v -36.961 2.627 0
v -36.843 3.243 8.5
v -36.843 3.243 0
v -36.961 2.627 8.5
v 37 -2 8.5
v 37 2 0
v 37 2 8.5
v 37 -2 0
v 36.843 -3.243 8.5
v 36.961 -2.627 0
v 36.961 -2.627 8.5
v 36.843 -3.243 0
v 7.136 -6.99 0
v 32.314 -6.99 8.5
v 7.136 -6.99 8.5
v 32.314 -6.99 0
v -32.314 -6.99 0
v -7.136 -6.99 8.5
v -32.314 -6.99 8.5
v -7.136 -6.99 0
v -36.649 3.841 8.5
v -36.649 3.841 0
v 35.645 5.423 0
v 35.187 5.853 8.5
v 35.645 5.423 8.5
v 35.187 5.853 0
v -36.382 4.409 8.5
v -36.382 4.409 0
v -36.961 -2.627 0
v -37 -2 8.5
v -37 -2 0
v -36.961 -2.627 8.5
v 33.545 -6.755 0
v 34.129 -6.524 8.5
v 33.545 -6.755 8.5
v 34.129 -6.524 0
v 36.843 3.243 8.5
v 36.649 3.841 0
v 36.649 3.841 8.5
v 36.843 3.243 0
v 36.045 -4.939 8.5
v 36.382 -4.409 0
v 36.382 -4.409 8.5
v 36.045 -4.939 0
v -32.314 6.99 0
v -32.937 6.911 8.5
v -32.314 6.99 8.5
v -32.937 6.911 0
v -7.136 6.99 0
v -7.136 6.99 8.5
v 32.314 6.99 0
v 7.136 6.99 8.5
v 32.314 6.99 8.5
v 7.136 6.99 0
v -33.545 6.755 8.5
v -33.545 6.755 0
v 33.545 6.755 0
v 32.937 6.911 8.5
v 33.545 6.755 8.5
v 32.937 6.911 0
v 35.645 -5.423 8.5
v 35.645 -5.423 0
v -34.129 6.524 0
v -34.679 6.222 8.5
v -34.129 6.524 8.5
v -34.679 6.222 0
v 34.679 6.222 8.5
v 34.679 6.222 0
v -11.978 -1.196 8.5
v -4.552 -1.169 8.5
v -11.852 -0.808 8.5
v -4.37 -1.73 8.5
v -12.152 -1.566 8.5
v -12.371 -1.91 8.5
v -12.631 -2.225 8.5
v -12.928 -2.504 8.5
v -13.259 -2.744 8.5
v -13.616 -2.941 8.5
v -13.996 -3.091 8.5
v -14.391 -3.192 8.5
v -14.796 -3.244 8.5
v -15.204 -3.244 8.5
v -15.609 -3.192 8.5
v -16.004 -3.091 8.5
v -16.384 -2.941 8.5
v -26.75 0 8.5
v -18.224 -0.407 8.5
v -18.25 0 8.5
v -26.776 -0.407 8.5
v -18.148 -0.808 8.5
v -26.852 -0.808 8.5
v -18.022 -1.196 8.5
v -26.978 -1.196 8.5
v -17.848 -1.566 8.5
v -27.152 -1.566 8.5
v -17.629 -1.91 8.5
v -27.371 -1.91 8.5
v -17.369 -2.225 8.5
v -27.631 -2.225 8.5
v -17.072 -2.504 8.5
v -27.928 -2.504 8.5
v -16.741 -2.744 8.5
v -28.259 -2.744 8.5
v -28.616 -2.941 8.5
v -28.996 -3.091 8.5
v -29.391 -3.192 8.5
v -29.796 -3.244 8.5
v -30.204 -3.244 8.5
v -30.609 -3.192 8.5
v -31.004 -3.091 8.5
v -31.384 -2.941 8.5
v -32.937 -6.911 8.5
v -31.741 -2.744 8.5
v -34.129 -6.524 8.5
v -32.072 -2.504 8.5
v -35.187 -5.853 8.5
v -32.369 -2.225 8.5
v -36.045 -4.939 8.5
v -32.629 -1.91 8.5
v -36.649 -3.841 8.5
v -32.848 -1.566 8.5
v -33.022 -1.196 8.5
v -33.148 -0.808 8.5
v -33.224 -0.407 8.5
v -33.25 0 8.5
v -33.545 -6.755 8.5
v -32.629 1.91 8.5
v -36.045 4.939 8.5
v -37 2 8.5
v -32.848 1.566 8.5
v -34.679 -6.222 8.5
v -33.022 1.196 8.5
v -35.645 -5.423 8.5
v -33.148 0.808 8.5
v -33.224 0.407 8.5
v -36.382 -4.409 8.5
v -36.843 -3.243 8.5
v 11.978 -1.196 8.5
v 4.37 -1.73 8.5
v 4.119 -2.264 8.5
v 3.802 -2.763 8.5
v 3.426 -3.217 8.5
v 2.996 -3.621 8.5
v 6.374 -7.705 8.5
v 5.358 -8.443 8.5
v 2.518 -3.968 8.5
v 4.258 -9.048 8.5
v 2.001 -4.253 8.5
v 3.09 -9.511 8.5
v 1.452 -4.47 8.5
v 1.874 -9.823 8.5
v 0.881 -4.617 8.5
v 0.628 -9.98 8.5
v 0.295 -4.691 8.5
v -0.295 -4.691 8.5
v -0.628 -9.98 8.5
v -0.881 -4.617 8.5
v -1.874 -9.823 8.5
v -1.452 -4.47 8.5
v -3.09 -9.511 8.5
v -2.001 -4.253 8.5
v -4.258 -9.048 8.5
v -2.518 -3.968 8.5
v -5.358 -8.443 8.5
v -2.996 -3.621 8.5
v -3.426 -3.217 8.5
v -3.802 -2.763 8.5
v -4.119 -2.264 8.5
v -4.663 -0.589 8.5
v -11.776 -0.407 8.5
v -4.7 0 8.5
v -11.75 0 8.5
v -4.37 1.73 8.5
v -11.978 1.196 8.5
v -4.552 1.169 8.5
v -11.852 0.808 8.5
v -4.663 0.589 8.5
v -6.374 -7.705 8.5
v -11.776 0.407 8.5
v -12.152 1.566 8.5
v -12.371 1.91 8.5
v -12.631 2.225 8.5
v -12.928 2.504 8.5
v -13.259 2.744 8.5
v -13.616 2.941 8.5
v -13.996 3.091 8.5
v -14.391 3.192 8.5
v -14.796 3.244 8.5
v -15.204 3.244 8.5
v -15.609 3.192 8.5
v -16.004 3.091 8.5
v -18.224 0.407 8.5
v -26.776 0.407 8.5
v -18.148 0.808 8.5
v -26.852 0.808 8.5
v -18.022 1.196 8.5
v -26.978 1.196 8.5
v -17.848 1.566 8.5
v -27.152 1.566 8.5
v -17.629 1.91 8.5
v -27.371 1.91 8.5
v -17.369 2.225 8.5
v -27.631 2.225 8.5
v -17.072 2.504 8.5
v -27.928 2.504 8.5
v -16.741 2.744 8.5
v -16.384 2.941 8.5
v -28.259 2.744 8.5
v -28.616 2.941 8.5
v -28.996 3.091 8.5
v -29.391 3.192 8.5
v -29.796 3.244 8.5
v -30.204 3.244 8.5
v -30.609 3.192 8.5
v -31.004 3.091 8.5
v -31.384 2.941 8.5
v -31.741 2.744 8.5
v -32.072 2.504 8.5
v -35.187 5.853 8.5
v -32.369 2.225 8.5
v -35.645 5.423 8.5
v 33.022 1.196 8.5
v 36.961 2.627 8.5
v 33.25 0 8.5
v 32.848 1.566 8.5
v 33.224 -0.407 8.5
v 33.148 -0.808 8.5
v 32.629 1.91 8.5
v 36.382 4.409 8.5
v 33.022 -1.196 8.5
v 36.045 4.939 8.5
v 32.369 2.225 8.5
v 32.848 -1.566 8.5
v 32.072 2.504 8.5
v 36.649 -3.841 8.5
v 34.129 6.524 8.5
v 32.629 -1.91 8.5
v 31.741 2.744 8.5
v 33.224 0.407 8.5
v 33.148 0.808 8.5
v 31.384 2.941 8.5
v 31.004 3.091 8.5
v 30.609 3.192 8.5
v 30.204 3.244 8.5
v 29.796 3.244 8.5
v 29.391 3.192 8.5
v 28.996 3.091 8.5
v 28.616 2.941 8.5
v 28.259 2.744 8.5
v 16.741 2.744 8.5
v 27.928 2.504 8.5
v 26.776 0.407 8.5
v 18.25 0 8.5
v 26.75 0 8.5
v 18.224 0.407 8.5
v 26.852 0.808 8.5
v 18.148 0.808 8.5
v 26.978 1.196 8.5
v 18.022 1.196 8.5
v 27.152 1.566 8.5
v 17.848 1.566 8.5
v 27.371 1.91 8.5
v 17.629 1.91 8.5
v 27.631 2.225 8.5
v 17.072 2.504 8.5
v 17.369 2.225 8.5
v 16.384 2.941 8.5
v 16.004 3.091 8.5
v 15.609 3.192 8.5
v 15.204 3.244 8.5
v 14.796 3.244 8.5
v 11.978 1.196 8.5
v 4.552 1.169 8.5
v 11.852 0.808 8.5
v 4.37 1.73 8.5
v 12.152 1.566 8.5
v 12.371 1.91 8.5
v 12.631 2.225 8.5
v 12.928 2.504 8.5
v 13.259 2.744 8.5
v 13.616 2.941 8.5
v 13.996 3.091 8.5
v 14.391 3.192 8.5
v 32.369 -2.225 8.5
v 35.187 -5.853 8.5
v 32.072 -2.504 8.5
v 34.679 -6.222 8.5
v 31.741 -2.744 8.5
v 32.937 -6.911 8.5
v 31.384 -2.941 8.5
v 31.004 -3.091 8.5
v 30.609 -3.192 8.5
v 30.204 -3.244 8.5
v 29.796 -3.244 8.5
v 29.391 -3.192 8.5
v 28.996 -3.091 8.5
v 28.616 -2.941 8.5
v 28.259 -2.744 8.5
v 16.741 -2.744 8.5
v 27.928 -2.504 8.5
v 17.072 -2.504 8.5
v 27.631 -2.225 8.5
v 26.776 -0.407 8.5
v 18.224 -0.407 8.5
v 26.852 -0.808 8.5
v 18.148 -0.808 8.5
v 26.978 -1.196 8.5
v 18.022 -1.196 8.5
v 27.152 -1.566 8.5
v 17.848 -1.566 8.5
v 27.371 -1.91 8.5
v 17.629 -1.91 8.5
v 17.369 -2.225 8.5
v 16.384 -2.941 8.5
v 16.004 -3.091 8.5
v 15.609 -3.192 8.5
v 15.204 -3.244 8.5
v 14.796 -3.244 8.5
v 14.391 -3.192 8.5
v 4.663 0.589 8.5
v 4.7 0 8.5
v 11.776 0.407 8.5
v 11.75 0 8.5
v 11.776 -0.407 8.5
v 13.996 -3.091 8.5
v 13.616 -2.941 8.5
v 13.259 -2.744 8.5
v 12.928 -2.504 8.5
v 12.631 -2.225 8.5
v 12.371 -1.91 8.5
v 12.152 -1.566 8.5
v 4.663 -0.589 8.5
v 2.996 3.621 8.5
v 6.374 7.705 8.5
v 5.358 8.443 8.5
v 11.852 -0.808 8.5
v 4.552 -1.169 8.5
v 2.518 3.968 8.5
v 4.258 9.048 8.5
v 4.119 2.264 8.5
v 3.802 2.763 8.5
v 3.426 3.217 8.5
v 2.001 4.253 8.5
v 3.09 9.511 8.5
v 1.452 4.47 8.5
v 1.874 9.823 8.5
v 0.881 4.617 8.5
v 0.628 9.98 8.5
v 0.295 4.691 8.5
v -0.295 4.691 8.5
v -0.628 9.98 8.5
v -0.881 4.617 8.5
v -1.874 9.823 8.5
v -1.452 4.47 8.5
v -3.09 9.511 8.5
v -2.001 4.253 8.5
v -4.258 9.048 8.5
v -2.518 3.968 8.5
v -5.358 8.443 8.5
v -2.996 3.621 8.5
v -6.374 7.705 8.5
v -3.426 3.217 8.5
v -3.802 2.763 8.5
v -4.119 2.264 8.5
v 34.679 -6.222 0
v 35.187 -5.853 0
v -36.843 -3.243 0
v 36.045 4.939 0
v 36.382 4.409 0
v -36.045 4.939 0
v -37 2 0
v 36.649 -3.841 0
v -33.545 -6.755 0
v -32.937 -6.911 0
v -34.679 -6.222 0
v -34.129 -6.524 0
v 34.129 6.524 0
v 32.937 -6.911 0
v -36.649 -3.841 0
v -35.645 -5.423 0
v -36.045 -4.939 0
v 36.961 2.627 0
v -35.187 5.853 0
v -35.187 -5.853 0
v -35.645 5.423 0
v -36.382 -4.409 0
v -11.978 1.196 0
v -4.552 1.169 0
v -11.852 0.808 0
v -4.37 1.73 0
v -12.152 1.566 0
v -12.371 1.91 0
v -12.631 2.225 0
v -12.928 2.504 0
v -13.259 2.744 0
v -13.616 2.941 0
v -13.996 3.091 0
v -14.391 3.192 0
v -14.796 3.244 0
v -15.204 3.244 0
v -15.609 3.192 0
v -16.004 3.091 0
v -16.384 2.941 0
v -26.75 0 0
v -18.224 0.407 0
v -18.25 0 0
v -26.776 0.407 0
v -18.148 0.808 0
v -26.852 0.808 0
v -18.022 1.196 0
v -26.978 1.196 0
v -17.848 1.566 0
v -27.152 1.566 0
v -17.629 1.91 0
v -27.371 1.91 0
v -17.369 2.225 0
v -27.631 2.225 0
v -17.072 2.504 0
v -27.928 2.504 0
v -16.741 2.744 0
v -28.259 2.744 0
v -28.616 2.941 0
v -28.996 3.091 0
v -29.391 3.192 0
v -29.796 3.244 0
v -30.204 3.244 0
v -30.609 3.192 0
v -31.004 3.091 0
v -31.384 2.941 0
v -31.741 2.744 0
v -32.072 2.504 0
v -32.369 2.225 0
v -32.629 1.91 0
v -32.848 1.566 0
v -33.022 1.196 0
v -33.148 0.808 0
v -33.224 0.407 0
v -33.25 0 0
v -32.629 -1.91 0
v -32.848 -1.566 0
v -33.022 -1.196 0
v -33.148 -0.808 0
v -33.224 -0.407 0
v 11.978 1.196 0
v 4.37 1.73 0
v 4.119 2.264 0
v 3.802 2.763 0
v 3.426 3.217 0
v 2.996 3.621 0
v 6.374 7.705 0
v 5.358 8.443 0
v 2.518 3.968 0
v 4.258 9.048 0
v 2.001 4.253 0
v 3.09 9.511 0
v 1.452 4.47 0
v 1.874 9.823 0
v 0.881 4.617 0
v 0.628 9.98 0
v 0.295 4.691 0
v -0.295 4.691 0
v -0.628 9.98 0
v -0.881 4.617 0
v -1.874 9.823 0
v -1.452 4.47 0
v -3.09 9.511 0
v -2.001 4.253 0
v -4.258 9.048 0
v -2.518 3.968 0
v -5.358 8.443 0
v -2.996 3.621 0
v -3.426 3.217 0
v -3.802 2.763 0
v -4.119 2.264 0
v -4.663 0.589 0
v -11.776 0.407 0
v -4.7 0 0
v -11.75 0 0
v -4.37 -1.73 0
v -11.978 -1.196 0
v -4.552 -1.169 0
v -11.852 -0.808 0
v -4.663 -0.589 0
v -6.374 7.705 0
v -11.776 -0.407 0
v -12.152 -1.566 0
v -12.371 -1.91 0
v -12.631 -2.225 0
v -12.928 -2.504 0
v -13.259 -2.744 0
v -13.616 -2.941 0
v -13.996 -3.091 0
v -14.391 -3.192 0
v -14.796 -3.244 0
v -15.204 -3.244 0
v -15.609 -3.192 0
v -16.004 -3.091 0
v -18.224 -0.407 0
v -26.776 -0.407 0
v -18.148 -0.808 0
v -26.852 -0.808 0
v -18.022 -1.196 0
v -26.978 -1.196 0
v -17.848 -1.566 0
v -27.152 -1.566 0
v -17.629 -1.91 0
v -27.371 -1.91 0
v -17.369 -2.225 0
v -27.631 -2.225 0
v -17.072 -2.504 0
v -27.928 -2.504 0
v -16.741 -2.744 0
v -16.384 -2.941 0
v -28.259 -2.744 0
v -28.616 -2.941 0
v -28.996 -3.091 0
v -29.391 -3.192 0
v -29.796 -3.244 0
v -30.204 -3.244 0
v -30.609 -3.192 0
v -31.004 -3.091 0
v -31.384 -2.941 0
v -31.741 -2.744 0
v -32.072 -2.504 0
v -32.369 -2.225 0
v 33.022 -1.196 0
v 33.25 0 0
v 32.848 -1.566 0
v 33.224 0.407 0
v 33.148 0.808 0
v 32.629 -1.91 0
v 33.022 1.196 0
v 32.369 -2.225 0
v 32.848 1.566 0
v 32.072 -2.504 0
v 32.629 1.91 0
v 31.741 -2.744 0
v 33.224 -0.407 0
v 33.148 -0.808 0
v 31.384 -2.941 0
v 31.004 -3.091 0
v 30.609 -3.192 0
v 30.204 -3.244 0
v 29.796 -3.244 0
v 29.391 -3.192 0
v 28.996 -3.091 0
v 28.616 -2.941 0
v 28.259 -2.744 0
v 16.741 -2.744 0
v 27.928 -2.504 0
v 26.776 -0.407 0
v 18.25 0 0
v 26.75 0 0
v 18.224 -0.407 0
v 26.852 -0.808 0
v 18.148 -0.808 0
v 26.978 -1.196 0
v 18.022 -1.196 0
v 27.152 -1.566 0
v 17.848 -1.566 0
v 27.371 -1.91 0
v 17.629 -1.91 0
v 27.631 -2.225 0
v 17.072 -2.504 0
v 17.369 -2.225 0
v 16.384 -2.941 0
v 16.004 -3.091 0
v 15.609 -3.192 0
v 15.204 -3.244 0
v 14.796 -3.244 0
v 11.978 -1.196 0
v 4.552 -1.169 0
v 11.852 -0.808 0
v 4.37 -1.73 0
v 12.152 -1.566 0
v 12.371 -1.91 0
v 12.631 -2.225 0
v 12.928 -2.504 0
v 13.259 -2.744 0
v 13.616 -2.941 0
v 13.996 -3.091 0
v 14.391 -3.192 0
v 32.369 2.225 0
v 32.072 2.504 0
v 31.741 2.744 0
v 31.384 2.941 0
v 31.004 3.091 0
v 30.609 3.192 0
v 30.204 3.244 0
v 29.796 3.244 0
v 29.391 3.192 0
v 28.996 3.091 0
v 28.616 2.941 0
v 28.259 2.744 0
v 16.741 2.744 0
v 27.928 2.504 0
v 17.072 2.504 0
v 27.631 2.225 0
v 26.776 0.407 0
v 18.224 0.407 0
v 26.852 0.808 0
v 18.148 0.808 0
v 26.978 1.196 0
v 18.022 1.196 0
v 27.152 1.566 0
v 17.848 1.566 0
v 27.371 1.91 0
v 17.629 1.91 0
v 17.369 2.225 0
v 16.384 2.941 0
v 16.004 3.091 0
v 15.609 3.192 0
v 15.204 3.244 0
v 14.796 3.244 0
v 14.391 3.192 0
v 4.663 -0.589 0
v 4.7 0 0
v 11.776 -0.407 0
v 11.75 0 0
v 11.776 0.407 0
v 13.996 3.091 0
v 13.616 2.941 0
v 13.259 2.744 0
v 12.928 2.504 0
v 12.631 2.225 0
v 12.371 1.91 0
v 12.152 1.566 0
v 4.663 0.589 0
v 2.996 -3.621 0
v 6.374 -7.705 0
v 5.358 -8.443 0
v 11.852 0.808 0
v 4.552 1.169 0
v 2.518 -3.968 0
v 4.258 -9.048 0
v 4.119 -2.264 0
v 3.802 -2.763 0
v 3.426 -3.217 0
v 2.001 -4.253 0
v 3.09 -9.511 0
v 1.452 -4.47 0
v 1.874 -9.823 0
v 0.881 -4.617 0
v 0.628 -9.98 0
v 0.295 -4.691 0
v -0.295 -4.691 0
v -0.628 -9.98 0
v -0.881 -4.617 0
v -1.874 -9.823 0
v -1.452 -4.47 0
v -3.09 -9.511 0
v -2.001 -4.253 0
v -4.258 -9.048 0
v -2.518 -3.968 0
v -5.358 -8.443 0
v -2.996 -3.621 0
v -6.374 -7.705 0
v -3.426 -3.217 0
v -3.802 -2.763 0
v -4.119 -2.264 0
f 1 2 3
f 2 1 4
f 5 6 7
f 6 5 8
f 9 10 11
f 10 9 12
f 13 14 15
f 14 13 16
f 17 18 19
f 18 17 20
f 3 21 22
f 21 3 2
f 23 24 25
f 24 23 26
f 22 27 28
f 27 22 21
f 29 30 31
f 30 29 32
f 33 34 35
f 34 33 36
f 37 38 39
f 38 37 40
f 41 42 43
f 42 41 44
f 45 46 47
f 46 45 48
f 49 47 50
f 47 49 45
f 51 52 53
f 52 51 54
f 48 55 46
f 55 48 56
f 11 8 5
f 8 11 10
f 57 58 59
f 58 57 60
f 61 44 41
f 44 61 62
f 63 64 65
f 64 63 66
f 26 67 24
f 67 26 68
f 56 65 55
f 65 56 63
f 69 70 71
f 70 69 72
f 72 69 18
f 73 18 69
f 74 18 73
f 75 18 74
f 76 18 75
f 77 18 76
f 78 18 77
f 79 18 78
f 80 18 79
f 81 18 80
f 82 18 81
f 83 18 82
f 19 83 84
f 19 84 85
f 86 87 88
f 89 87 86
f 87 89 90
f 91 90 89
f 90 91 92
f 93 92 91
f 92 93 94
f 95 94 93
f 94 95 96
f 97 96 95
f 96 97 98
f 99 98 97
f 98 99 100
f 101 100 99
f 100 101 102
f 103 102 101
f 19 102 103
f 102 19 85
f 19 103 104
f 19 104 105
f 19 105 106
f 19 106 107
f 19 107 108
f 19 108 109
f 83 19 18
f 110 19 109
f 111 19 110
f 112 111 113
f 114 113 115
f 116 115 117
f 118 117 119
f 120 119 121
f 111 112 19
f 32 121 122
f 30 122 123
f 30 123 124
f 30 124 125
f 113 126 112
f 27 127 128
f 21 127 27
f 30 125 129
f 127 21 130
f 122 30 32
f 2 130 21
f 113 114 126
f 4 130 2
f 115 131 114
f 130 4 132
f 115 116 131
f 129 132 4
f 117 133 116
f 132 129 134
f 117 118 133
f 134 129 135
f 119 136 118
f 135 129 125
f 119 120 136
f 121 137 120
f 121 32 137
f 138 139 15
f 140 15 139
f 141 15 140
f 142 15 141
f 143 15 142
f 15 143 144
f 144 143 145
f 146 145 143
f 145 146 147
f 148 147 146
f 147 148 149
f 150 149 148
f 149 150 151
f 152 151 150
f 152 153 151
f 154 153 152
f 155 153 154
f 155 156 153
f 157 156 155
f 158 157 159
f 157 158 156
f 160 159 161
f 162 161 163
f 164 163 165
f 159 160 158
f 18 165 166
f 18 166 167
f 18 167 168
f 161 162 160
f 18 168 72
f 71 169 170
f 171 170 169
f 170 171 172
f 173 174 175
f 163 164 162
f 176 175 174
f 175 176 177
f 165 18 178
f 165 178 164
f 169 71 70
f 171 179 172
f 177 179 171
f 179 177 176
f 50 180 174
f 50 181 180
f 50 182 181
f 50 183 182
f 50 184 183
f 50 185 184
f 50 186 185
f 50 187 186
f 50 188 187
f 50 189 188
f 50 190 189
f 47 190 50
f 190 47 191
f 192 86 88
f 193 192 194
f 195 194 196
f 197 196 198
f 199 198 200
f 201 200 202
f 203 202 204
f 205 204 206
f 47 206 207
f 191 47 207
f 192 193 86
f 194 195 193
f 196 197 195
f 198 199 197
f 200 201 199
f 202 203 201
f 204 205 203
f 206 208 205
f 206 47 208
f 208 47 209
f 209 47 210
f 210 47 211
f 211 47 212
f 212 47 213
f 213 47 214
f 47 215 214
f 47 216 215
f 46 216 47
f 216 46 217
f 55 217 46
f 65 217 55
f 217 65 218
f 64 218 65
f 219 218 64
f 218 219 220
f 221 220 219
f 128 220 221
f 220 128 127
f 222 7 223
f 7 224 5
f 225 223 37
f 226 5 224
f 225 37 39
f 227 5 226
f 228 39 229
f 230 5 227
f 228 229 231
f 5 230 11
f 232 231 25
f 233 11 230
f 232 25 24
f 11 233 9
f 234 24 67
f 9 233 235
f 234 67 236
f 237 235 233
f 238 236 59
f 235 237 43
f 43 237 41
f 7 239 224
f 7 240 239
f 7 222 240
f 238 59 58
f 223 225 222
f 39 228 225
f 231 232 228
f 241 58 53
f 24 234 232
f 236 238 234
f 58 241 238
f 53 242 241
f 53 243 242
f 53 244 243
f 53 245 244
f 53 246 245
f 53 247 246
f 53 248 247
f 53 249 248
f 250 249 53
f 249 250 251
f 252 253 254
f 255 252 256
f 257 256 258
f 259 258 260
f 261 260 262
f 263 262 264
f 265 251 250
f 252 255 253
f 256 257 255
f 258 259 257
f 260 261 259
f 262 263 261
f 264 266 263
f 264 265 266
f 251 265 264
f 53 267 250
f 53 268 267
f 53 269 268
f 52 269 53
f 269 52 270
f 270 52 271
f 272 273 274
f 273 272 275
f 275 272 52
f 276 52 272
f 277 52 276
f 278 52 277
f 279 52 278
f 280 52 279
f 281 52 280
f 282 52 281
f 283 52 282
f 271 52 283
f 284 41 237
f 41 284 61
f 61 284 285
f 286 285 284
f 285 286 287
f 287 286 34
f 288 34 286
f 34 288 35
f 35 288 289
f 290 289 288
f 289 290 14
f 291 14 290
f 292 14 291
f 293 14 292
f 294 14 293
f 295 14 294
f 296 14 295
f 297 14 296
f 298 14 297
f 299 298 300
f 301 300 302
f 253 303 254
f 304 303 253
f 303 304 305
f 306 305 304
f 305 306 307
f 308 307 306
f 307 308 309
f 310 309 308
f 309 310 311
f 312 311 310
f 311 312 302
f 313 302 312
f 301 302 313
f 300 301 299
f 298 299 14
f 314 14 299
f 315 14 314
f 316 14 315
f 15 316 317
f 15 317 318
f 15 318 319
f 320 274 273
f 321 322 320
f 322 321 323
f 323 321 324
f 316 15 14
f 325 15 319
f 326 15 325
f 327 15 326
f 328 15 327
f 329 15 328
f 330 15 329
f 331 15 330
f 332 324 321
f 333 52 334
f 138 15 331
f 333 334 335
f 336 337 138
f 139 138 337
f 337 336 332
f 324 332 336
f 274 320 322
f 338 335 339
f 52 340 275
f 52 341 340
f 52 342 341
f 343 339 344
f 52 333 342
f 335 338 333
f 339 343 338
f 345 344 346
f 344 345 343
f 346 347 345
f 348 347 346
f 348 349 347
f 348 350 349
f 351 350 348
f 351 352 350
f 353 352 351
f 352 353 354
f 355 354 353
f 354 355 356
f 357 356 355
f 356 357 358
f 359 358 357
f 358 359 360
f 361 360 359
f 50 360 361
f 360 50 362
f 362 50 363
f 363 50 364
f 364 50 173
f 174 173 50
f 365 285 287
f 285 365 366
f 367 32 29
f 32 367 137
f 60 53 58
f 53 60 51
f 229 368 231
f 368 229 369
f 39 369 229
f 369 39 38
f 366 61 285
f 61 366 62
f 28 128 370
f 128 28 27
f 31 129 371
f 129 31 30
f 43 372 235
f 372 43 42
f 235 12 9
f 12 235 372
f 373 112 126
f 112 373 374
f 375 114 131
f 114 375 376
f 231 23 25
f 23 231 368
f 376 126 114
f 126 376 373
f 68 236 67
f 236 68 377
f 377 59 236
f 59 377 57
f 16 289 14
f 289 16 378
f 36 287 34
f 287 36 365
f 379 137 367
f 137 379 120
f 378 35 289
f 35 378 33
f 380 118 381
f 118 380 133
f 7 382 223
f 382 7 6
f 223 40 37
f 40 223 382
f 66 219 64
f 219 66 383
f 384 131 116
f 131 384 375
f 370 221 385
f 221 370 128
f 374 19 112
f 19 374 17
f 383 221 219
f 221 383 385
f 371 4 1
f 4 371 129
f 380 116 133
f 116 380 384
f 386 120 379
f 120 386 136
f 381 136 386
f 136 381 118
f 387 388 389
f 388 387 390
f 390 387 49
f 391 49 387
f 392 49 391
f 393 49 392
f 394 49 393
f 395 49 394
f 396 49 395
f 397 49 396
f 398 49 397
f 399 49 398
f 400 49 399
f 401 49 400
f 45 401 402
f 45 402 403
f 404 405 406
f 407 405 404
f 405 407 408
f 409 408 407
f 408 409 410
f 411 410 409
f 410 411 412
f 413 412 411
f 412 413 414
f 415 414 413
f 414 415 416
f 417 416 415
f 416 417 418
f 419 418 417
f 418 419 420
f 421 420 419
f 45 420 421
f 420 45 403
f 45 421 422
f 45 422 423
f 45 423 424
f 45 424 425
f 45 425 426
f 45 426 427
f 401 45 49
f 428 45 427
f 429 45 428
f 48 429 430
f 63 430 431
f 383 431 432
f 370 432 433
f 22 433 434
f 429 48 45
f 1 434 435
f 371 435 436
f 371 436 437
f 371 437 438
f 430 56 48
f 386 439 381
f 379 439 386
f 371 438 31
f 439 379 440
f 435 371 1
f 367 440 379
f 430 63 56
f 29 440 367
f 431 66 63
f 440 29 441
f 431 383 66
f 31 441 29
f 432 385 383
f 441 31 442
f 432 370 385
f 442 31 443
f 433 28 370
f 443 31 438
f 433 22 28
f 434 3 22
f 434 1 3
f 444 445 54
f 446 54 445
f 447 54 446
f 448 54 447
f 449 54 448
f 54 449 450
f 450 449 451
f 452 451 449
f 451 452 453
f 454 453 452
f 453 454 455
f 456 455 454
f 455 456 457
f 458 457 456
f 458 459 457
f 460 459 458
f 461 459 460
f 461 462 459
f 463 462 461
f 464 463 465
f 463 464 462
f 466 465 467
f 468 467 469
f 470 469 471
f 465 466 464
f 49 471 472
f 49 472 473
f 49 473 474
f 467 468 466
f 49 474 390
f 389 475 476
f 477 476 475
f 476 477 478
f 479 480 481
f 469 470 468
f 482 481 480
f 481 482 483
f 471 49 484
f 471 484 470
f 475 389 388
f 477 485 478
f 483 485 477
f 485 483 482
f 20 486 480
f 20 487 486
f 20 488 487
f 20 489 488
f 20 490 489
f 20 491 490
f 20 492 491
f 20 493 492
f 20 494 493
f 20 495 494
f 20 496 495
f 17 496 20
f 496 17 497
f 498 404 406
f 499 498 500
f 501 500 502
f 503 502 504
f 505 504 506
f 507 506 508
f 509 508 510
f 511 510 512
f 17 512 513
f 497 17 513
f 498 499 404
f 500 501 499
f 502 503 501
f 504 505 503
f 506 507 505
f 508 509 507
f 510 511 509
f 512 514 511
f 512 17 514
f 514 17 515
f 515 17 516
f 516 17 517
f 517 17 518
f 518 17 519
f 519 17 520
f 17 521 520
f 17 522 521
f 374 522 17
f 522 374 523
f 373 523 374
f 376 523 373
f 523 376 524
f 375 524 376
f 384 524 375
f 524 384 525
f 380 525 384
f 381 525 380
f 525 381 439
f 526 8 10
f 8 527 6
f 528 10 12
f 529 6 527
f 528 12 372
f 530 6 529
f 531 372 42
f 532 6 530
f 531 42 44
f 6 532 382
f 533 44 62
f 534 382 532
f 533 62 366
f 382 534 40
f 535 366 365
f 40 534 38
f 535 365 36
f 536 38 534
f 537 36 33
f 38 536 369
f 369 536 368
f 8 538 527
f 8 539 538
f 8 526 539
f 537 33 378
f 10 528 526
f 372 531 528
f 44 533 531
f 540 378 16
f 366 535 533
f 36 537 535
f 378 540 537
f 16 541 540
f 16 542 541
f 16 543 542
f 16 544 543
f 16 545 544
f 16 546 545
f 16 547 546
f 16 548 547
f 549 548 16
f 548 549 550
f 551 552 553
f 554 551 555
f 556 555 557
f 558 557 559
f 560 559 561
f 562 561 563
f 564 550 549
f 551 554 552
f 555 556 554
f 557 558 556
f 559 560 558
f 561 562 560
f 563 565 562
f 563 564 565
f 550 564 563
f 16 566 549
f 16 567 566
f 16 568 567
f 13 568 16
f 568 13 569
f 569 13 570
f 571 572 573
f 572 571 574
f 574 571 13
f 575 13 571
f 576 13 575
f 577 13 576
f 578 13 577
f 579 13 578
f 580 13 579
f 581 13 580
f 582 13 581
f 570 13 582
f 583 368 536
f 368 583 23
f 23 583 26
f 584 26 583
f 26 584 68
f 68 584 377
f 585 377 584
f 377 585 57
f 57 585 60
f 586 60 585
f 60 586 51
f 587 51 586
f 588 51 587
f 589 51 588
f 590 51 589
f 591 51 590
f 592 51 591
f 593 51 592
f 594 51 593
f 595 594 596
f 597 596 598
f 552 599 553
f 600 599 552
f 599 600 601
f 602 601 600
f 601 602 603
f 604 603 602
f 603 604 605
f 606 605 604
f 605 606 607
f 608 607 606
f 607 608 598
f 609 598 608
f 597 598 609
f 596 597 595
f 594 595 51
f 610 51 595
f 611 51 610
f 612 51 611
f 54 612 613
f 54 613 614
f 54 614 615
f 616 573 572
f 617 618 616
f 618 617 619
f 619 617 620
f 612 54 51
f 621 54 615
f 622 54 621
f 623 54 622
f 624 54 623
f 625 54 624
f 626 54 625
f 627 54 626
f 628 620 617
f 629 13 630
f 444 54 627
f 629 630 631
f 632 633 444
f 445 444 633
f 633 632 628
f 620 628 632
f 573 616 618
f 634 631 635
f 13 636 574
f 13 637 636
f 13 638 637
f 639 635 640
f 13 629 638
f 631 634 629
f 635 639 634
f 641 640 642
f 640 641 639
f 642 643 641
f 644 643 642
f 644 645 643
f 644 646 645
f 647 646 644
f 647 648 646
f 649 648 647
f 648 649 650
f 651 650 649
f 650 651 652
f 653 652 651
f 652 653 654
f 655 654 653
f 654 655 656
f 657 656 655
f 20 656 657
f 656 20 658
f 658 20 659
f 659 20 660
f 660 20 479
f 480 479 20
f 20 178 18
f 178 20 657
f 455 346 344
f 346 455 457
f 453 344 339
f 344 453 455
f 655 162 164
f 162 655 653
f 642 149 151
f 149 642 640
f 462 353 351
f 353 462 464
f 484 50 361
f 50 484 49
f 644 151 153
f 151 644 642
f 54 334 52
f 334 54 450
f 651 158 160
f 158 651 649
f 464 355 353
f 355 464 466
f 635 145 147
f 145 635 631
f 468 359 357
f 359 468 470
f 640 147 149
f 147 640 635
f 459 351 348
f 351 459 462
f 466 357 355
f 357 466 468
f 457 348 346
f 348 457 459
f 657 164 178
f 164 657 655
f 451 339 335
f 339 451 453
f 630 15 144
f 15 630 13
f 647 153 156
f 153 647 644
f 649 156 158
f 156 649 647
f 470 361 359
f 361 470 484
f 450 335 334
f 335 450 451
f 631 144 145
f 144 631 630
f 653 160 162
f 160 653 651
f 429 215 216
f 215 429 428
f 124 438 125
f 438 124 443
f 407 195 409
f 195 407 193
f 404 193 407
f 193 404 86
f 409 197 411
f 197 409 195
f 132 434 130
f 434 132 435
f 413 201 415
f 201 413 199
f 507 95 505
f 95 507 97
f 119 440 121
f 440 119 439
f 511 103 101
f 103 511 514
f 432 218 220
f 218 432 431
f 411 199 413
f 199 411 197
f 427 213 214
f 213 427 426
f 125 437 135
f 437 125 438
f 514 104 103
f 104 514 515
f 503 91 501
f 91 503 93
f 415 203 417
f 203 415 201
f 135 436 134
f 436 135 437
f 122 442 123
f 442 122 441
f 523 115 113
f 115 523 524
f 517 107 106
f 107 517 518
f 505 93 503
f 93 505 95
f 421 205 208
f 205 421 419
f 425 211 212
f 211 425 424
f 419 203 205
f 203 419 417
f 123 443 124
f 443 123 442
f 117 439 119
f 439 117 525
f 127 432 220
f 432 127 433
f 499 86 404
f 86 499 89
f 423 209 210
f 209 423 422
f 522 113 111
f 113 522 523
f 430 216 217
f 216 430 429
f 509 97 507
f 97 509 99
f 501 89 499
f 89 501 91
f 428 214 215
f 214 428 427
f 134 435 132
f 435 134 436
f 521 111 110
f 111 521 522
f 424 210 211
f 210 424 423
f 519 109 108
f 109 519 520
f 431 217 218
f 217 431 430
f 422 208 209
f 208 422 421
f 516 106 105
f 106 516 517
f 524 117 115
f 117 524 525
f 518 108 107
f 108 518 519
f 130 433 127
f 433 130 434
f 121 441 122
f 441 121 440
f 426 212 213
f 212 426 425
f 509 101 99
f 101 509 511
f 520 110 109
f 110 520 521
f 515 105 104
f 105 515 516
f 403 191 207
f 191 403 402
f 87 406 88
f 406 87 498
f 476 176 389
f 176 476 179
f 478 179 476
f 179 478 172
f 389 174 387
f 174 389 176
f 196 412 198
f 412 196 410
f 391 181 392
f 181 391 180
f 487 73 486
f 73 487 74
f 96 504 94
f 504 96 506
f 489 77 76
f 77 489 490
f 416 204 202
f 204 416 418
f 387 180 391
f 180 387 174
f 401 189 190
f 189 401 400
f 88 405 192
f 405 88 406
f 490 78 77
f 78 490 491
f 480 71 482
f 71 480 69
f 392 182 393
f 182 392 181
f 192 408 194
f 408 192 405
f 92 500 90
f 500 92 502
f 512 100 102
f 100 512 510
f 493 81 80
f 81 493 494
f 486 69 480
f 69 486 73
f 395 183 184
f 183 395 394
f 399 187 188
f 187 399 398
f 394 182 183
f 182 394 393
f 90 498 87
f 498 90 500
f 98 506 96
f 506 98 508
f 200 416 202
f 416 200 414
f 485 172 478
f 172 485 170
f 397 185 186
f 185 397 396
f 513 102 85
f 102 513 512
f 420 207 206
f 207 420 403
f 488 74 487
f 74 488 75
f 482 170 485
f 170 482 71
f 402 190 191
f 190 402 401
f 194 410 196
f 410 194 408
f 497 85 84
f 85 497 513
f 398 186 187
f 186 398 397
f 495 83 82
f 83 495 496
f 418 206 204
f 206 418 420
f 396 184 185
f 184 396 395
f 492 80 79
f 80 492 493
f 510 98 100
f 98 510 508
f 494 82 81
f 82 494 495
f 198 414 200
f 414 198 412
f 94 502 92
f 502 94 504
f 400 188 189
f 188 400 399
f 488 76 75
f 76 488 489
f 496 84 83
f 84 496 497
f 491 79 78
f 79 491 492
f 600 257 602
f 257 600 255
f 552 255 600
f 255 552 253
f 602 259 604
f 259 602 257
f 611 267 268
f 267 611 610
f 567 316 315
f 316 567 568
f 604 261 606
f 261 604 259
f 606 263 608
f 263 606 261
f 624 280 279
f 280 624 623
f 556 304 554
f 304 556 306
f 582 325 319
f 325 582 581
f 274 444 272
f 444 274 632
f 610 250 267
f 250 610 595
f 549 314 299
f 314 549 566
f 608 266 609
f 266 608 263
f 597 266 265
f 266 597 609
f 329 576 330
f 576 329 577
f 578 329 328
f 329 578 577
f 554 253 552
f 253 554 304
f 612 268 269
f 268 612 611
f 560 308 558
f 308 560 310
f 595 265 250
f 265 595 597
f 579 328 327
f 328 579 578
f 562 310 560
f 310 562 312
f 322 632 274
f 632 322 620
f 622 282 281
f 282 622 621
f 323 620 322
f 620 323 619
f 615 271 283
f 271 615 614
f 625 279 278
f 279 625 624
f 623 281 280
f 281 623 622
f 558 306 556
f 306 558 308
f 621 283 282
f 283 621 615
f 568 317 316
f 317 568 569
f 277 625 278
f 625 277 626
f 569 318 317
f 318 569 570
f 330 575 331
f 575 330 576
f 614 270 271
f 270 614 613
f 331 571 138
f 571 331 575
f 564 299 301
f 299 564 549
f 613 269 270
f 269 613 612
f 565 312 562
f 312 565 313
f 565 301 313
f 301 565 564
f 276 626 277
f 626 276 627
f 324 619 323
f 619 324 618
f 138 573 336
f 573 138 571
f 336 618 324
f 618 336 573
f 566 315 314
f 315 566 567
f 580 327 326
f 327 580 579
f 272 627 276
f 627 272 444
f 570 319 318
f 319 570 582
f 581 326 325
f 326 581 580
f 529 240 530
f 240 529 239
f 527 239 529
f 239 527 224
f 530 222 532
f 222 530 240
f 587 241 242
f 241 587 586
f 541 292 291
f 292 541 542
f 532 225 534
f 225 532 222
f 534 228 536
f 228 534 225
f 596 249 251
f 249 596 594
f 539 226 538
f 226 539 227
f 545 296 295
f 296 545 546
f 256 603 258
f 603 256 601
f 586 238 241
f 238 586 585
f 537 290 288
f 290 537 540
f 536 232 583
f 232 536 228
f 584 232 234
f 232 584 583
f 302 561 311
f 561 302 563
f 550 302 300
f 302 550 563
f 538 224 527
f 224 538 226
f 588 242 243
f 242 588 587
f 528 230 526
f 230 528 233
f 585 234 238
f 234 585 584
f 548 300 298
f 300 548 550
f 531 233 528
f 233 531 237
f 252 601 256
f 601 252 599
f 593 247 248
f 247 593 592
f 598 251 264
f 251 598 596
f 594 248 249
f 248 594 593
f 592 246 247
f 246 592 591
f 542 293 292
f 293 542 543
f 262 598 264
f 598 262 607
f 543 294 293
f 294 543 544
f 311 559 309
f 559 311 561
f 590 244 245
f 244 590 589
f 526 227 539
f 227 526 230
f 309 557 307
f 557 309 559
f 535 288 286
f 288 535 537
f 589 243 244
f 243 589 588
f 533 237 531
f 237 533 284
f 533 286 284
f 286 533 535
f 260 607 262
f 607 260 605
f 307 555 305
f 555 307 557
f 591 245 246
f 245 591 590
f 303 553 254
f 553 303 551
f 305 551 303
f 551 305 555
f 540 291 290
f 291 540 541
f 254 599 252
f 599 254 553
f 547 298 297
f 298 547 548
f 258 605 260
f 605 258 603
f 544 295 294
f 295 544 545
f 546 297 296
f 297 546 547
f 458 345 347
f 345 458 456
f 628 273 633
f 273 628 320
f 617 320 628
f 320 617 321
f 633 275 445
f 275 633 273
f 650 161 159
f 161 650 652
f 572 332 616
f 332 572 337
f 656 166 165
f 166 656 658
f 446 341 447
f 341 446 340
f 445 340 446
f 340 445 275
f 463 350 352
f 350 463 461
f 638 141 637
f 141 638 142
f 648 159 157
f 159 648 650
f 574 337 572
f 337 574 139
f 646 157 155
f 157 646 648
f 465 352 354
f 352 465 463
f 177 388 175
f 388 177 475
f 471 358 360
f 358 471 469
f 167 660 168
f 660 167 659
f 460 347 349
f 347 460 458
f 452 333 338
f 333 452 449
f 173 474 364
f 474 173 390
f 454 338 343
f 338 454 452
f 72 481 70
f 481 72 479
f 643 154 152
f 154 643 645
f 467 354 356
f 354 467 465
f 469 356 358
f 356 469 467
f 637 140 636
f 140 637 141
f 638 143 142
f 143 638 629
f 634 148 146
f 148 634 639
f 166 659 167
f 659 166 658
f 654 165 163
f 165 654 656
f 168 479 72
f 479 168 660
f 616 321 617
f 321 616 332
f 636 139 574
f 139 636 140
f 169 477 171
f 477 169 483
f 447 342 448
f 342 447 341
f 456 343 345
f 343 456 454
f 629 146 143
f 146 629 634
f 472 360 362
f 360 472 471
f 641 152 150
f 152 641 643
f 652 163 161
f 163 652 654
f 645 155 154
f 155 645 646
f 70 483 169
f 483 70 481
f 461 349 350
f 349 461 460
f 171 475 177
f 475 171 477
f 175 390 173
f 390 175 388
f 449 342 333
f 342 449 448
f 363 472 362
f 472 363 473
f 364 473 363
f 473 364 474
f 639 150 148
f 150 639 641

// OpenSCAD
$fn = 50;


difference() {
	union() {
		*color(alpha = 1.0000000000, c = "gray") {
			translate(v = [0, 7, 0]) {
				linear_extrude(height = 1) {
					text(font = "Arial:style=Bold", halign = "center", size = 4.5000000000, text = "COMMENT plate main", valign = "center");
				}
			}
		}
		*color(alpha = 1.0000000000, c = "gray") {
			translate(v = [0, 14, 0]) {
				linear_extrude(height = 1) {
					text(font = "Arial:style=Bold", halign = "center", size = 4.5000000000, text = "COMMENT description oobb_plate_shape_p_type_8.5_depth_5_width_1_height_8.5_thickness_slip_center_extra", valign = "center");
				}
			}
		}
		hull() {
			translate(v = [-32.0000000000, 2.0000000000, 0]) {
				cylinder(h = 8.5000000000, r = 5);
			}
			translate(v = [32.0000000000, 2.0000000000, 0]) {
				cylinder(h = 8.5000000000, r = 5);
			}
			translate(v = [-32.0000000000, -2.0000000000, 0]) {
				cylinder(h = 8.5000000000, r = 5);
			}
			translate(v = [32.0000000000, -2.0000000000, 0]) {
				cylinder(h = 8.5000000000, r = 5);
			}
		}
		cylinder(h = 8.5000000000, r = 10.0000000000);
	}
	union() {
		*color(alpha = 1.0000000000, c = "gray") {
			translate(v = [0, 7, 0]) {
				linear_extrude(height = 1) {
					text(font = "Arial:style=Bold", halign = "center", size = 4.5000000000, text = "COMMENT holes main", valign = "center");
				}
			}
		}
		*color(alpha = 1.0000000000, c = "gray") {
			translate(v = [0, 14, 0]) {
				linear_extrude(height = 1) {
					text(font = "Arial:style=Bold", halign = "center", size = 4.5000000000, text = "COMMENT description oobb_holes_shape_n_type_5_width_1_height_8.5_thickness_slip_center_extra_false_both_holes", valign = "center");
				}
			}
		}
		translate(v = [-30.0000000000, 0.0000000000, 0]) {
			translate(v = [0, 0, -50]) {
				cylinder(h = 100, r = 3.2500000000);
			}
		}
		translate(v = [-15.0000000000, 0.0000000000, 0]) {
			translate(v = [0, 0, -50]) {
				cylinder(h = 100, r = 3.2500000000);
			}
		}
		translate(v = [0, 0, -50]) {
			cylinder(h = 100, r = 3.2500000000);
		}
		translate(v = [15.0000000000, 0.0000000000, 0]) {
			translate(v = [0, 0, -50]) {
				cylinder(h = 100, r = 3.2500000000);
			}
		}
		translate(v = [30.0000000000, 0.0000000000, 0]) {
			translate(v = [0, 0, -50]) {
				cylinder(h = 100, r = 3.2500000000);
			}
		}
		*color(alpha = 1.0000000000, c = "gray") {
			translate(v = [0, 7, 0]) {
				linear_extrude(height = 1) {
					text(font = "Arial:style=Bold", halign = "center", size = 4.5000000000, text = "COMMENT extra slip_center", valign = "center");
				}
			}
		}
		translate(v = [0, 0, -50.0000000000]) {
			cylinder(h = 100, r = 4.7000000000);
		}
	}
}
